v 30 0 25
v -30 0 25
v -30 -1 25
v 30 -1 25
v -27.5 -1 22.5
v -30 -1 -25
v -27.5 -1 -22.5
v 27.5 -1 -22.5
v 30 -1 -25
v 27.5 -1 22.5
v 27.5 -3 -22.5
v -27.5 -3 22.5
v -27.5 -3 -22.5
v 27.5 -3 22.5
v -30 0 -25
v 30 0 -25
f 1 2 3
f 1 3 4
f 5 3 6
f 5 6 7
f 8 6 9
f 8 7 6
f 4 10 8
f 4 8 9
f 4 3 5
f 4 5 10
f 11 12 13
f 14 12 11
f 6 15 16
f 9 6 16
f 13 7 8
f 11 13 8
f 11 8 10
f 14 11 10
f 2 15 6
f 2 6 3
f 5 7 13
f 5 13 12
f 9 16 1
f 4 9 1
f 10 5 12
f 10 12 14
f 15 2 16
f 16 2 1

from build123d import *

# Parameters (mm, degrees)
F1_W     = 55
F1_H     = 45
F2_DEPTH = 3
F0_W     = 60
F0_H     = 50
F3_DEPTH = 1


with BuildPart() as f2:
    # F1 (on face) → F2 (new body)
    with BuildSketch(Plane.XZ):
        Rectangle(F1_W, F1_H)
    extrude(amount=F2_DEPTH)

    # F0 (on Front) → F3 (join)
    with BuildSketch(Plane.XZ):
        Rectangle(F0_W, F0_H)
    extrude(amount=F3_DEPTH)


solid = f2.part
